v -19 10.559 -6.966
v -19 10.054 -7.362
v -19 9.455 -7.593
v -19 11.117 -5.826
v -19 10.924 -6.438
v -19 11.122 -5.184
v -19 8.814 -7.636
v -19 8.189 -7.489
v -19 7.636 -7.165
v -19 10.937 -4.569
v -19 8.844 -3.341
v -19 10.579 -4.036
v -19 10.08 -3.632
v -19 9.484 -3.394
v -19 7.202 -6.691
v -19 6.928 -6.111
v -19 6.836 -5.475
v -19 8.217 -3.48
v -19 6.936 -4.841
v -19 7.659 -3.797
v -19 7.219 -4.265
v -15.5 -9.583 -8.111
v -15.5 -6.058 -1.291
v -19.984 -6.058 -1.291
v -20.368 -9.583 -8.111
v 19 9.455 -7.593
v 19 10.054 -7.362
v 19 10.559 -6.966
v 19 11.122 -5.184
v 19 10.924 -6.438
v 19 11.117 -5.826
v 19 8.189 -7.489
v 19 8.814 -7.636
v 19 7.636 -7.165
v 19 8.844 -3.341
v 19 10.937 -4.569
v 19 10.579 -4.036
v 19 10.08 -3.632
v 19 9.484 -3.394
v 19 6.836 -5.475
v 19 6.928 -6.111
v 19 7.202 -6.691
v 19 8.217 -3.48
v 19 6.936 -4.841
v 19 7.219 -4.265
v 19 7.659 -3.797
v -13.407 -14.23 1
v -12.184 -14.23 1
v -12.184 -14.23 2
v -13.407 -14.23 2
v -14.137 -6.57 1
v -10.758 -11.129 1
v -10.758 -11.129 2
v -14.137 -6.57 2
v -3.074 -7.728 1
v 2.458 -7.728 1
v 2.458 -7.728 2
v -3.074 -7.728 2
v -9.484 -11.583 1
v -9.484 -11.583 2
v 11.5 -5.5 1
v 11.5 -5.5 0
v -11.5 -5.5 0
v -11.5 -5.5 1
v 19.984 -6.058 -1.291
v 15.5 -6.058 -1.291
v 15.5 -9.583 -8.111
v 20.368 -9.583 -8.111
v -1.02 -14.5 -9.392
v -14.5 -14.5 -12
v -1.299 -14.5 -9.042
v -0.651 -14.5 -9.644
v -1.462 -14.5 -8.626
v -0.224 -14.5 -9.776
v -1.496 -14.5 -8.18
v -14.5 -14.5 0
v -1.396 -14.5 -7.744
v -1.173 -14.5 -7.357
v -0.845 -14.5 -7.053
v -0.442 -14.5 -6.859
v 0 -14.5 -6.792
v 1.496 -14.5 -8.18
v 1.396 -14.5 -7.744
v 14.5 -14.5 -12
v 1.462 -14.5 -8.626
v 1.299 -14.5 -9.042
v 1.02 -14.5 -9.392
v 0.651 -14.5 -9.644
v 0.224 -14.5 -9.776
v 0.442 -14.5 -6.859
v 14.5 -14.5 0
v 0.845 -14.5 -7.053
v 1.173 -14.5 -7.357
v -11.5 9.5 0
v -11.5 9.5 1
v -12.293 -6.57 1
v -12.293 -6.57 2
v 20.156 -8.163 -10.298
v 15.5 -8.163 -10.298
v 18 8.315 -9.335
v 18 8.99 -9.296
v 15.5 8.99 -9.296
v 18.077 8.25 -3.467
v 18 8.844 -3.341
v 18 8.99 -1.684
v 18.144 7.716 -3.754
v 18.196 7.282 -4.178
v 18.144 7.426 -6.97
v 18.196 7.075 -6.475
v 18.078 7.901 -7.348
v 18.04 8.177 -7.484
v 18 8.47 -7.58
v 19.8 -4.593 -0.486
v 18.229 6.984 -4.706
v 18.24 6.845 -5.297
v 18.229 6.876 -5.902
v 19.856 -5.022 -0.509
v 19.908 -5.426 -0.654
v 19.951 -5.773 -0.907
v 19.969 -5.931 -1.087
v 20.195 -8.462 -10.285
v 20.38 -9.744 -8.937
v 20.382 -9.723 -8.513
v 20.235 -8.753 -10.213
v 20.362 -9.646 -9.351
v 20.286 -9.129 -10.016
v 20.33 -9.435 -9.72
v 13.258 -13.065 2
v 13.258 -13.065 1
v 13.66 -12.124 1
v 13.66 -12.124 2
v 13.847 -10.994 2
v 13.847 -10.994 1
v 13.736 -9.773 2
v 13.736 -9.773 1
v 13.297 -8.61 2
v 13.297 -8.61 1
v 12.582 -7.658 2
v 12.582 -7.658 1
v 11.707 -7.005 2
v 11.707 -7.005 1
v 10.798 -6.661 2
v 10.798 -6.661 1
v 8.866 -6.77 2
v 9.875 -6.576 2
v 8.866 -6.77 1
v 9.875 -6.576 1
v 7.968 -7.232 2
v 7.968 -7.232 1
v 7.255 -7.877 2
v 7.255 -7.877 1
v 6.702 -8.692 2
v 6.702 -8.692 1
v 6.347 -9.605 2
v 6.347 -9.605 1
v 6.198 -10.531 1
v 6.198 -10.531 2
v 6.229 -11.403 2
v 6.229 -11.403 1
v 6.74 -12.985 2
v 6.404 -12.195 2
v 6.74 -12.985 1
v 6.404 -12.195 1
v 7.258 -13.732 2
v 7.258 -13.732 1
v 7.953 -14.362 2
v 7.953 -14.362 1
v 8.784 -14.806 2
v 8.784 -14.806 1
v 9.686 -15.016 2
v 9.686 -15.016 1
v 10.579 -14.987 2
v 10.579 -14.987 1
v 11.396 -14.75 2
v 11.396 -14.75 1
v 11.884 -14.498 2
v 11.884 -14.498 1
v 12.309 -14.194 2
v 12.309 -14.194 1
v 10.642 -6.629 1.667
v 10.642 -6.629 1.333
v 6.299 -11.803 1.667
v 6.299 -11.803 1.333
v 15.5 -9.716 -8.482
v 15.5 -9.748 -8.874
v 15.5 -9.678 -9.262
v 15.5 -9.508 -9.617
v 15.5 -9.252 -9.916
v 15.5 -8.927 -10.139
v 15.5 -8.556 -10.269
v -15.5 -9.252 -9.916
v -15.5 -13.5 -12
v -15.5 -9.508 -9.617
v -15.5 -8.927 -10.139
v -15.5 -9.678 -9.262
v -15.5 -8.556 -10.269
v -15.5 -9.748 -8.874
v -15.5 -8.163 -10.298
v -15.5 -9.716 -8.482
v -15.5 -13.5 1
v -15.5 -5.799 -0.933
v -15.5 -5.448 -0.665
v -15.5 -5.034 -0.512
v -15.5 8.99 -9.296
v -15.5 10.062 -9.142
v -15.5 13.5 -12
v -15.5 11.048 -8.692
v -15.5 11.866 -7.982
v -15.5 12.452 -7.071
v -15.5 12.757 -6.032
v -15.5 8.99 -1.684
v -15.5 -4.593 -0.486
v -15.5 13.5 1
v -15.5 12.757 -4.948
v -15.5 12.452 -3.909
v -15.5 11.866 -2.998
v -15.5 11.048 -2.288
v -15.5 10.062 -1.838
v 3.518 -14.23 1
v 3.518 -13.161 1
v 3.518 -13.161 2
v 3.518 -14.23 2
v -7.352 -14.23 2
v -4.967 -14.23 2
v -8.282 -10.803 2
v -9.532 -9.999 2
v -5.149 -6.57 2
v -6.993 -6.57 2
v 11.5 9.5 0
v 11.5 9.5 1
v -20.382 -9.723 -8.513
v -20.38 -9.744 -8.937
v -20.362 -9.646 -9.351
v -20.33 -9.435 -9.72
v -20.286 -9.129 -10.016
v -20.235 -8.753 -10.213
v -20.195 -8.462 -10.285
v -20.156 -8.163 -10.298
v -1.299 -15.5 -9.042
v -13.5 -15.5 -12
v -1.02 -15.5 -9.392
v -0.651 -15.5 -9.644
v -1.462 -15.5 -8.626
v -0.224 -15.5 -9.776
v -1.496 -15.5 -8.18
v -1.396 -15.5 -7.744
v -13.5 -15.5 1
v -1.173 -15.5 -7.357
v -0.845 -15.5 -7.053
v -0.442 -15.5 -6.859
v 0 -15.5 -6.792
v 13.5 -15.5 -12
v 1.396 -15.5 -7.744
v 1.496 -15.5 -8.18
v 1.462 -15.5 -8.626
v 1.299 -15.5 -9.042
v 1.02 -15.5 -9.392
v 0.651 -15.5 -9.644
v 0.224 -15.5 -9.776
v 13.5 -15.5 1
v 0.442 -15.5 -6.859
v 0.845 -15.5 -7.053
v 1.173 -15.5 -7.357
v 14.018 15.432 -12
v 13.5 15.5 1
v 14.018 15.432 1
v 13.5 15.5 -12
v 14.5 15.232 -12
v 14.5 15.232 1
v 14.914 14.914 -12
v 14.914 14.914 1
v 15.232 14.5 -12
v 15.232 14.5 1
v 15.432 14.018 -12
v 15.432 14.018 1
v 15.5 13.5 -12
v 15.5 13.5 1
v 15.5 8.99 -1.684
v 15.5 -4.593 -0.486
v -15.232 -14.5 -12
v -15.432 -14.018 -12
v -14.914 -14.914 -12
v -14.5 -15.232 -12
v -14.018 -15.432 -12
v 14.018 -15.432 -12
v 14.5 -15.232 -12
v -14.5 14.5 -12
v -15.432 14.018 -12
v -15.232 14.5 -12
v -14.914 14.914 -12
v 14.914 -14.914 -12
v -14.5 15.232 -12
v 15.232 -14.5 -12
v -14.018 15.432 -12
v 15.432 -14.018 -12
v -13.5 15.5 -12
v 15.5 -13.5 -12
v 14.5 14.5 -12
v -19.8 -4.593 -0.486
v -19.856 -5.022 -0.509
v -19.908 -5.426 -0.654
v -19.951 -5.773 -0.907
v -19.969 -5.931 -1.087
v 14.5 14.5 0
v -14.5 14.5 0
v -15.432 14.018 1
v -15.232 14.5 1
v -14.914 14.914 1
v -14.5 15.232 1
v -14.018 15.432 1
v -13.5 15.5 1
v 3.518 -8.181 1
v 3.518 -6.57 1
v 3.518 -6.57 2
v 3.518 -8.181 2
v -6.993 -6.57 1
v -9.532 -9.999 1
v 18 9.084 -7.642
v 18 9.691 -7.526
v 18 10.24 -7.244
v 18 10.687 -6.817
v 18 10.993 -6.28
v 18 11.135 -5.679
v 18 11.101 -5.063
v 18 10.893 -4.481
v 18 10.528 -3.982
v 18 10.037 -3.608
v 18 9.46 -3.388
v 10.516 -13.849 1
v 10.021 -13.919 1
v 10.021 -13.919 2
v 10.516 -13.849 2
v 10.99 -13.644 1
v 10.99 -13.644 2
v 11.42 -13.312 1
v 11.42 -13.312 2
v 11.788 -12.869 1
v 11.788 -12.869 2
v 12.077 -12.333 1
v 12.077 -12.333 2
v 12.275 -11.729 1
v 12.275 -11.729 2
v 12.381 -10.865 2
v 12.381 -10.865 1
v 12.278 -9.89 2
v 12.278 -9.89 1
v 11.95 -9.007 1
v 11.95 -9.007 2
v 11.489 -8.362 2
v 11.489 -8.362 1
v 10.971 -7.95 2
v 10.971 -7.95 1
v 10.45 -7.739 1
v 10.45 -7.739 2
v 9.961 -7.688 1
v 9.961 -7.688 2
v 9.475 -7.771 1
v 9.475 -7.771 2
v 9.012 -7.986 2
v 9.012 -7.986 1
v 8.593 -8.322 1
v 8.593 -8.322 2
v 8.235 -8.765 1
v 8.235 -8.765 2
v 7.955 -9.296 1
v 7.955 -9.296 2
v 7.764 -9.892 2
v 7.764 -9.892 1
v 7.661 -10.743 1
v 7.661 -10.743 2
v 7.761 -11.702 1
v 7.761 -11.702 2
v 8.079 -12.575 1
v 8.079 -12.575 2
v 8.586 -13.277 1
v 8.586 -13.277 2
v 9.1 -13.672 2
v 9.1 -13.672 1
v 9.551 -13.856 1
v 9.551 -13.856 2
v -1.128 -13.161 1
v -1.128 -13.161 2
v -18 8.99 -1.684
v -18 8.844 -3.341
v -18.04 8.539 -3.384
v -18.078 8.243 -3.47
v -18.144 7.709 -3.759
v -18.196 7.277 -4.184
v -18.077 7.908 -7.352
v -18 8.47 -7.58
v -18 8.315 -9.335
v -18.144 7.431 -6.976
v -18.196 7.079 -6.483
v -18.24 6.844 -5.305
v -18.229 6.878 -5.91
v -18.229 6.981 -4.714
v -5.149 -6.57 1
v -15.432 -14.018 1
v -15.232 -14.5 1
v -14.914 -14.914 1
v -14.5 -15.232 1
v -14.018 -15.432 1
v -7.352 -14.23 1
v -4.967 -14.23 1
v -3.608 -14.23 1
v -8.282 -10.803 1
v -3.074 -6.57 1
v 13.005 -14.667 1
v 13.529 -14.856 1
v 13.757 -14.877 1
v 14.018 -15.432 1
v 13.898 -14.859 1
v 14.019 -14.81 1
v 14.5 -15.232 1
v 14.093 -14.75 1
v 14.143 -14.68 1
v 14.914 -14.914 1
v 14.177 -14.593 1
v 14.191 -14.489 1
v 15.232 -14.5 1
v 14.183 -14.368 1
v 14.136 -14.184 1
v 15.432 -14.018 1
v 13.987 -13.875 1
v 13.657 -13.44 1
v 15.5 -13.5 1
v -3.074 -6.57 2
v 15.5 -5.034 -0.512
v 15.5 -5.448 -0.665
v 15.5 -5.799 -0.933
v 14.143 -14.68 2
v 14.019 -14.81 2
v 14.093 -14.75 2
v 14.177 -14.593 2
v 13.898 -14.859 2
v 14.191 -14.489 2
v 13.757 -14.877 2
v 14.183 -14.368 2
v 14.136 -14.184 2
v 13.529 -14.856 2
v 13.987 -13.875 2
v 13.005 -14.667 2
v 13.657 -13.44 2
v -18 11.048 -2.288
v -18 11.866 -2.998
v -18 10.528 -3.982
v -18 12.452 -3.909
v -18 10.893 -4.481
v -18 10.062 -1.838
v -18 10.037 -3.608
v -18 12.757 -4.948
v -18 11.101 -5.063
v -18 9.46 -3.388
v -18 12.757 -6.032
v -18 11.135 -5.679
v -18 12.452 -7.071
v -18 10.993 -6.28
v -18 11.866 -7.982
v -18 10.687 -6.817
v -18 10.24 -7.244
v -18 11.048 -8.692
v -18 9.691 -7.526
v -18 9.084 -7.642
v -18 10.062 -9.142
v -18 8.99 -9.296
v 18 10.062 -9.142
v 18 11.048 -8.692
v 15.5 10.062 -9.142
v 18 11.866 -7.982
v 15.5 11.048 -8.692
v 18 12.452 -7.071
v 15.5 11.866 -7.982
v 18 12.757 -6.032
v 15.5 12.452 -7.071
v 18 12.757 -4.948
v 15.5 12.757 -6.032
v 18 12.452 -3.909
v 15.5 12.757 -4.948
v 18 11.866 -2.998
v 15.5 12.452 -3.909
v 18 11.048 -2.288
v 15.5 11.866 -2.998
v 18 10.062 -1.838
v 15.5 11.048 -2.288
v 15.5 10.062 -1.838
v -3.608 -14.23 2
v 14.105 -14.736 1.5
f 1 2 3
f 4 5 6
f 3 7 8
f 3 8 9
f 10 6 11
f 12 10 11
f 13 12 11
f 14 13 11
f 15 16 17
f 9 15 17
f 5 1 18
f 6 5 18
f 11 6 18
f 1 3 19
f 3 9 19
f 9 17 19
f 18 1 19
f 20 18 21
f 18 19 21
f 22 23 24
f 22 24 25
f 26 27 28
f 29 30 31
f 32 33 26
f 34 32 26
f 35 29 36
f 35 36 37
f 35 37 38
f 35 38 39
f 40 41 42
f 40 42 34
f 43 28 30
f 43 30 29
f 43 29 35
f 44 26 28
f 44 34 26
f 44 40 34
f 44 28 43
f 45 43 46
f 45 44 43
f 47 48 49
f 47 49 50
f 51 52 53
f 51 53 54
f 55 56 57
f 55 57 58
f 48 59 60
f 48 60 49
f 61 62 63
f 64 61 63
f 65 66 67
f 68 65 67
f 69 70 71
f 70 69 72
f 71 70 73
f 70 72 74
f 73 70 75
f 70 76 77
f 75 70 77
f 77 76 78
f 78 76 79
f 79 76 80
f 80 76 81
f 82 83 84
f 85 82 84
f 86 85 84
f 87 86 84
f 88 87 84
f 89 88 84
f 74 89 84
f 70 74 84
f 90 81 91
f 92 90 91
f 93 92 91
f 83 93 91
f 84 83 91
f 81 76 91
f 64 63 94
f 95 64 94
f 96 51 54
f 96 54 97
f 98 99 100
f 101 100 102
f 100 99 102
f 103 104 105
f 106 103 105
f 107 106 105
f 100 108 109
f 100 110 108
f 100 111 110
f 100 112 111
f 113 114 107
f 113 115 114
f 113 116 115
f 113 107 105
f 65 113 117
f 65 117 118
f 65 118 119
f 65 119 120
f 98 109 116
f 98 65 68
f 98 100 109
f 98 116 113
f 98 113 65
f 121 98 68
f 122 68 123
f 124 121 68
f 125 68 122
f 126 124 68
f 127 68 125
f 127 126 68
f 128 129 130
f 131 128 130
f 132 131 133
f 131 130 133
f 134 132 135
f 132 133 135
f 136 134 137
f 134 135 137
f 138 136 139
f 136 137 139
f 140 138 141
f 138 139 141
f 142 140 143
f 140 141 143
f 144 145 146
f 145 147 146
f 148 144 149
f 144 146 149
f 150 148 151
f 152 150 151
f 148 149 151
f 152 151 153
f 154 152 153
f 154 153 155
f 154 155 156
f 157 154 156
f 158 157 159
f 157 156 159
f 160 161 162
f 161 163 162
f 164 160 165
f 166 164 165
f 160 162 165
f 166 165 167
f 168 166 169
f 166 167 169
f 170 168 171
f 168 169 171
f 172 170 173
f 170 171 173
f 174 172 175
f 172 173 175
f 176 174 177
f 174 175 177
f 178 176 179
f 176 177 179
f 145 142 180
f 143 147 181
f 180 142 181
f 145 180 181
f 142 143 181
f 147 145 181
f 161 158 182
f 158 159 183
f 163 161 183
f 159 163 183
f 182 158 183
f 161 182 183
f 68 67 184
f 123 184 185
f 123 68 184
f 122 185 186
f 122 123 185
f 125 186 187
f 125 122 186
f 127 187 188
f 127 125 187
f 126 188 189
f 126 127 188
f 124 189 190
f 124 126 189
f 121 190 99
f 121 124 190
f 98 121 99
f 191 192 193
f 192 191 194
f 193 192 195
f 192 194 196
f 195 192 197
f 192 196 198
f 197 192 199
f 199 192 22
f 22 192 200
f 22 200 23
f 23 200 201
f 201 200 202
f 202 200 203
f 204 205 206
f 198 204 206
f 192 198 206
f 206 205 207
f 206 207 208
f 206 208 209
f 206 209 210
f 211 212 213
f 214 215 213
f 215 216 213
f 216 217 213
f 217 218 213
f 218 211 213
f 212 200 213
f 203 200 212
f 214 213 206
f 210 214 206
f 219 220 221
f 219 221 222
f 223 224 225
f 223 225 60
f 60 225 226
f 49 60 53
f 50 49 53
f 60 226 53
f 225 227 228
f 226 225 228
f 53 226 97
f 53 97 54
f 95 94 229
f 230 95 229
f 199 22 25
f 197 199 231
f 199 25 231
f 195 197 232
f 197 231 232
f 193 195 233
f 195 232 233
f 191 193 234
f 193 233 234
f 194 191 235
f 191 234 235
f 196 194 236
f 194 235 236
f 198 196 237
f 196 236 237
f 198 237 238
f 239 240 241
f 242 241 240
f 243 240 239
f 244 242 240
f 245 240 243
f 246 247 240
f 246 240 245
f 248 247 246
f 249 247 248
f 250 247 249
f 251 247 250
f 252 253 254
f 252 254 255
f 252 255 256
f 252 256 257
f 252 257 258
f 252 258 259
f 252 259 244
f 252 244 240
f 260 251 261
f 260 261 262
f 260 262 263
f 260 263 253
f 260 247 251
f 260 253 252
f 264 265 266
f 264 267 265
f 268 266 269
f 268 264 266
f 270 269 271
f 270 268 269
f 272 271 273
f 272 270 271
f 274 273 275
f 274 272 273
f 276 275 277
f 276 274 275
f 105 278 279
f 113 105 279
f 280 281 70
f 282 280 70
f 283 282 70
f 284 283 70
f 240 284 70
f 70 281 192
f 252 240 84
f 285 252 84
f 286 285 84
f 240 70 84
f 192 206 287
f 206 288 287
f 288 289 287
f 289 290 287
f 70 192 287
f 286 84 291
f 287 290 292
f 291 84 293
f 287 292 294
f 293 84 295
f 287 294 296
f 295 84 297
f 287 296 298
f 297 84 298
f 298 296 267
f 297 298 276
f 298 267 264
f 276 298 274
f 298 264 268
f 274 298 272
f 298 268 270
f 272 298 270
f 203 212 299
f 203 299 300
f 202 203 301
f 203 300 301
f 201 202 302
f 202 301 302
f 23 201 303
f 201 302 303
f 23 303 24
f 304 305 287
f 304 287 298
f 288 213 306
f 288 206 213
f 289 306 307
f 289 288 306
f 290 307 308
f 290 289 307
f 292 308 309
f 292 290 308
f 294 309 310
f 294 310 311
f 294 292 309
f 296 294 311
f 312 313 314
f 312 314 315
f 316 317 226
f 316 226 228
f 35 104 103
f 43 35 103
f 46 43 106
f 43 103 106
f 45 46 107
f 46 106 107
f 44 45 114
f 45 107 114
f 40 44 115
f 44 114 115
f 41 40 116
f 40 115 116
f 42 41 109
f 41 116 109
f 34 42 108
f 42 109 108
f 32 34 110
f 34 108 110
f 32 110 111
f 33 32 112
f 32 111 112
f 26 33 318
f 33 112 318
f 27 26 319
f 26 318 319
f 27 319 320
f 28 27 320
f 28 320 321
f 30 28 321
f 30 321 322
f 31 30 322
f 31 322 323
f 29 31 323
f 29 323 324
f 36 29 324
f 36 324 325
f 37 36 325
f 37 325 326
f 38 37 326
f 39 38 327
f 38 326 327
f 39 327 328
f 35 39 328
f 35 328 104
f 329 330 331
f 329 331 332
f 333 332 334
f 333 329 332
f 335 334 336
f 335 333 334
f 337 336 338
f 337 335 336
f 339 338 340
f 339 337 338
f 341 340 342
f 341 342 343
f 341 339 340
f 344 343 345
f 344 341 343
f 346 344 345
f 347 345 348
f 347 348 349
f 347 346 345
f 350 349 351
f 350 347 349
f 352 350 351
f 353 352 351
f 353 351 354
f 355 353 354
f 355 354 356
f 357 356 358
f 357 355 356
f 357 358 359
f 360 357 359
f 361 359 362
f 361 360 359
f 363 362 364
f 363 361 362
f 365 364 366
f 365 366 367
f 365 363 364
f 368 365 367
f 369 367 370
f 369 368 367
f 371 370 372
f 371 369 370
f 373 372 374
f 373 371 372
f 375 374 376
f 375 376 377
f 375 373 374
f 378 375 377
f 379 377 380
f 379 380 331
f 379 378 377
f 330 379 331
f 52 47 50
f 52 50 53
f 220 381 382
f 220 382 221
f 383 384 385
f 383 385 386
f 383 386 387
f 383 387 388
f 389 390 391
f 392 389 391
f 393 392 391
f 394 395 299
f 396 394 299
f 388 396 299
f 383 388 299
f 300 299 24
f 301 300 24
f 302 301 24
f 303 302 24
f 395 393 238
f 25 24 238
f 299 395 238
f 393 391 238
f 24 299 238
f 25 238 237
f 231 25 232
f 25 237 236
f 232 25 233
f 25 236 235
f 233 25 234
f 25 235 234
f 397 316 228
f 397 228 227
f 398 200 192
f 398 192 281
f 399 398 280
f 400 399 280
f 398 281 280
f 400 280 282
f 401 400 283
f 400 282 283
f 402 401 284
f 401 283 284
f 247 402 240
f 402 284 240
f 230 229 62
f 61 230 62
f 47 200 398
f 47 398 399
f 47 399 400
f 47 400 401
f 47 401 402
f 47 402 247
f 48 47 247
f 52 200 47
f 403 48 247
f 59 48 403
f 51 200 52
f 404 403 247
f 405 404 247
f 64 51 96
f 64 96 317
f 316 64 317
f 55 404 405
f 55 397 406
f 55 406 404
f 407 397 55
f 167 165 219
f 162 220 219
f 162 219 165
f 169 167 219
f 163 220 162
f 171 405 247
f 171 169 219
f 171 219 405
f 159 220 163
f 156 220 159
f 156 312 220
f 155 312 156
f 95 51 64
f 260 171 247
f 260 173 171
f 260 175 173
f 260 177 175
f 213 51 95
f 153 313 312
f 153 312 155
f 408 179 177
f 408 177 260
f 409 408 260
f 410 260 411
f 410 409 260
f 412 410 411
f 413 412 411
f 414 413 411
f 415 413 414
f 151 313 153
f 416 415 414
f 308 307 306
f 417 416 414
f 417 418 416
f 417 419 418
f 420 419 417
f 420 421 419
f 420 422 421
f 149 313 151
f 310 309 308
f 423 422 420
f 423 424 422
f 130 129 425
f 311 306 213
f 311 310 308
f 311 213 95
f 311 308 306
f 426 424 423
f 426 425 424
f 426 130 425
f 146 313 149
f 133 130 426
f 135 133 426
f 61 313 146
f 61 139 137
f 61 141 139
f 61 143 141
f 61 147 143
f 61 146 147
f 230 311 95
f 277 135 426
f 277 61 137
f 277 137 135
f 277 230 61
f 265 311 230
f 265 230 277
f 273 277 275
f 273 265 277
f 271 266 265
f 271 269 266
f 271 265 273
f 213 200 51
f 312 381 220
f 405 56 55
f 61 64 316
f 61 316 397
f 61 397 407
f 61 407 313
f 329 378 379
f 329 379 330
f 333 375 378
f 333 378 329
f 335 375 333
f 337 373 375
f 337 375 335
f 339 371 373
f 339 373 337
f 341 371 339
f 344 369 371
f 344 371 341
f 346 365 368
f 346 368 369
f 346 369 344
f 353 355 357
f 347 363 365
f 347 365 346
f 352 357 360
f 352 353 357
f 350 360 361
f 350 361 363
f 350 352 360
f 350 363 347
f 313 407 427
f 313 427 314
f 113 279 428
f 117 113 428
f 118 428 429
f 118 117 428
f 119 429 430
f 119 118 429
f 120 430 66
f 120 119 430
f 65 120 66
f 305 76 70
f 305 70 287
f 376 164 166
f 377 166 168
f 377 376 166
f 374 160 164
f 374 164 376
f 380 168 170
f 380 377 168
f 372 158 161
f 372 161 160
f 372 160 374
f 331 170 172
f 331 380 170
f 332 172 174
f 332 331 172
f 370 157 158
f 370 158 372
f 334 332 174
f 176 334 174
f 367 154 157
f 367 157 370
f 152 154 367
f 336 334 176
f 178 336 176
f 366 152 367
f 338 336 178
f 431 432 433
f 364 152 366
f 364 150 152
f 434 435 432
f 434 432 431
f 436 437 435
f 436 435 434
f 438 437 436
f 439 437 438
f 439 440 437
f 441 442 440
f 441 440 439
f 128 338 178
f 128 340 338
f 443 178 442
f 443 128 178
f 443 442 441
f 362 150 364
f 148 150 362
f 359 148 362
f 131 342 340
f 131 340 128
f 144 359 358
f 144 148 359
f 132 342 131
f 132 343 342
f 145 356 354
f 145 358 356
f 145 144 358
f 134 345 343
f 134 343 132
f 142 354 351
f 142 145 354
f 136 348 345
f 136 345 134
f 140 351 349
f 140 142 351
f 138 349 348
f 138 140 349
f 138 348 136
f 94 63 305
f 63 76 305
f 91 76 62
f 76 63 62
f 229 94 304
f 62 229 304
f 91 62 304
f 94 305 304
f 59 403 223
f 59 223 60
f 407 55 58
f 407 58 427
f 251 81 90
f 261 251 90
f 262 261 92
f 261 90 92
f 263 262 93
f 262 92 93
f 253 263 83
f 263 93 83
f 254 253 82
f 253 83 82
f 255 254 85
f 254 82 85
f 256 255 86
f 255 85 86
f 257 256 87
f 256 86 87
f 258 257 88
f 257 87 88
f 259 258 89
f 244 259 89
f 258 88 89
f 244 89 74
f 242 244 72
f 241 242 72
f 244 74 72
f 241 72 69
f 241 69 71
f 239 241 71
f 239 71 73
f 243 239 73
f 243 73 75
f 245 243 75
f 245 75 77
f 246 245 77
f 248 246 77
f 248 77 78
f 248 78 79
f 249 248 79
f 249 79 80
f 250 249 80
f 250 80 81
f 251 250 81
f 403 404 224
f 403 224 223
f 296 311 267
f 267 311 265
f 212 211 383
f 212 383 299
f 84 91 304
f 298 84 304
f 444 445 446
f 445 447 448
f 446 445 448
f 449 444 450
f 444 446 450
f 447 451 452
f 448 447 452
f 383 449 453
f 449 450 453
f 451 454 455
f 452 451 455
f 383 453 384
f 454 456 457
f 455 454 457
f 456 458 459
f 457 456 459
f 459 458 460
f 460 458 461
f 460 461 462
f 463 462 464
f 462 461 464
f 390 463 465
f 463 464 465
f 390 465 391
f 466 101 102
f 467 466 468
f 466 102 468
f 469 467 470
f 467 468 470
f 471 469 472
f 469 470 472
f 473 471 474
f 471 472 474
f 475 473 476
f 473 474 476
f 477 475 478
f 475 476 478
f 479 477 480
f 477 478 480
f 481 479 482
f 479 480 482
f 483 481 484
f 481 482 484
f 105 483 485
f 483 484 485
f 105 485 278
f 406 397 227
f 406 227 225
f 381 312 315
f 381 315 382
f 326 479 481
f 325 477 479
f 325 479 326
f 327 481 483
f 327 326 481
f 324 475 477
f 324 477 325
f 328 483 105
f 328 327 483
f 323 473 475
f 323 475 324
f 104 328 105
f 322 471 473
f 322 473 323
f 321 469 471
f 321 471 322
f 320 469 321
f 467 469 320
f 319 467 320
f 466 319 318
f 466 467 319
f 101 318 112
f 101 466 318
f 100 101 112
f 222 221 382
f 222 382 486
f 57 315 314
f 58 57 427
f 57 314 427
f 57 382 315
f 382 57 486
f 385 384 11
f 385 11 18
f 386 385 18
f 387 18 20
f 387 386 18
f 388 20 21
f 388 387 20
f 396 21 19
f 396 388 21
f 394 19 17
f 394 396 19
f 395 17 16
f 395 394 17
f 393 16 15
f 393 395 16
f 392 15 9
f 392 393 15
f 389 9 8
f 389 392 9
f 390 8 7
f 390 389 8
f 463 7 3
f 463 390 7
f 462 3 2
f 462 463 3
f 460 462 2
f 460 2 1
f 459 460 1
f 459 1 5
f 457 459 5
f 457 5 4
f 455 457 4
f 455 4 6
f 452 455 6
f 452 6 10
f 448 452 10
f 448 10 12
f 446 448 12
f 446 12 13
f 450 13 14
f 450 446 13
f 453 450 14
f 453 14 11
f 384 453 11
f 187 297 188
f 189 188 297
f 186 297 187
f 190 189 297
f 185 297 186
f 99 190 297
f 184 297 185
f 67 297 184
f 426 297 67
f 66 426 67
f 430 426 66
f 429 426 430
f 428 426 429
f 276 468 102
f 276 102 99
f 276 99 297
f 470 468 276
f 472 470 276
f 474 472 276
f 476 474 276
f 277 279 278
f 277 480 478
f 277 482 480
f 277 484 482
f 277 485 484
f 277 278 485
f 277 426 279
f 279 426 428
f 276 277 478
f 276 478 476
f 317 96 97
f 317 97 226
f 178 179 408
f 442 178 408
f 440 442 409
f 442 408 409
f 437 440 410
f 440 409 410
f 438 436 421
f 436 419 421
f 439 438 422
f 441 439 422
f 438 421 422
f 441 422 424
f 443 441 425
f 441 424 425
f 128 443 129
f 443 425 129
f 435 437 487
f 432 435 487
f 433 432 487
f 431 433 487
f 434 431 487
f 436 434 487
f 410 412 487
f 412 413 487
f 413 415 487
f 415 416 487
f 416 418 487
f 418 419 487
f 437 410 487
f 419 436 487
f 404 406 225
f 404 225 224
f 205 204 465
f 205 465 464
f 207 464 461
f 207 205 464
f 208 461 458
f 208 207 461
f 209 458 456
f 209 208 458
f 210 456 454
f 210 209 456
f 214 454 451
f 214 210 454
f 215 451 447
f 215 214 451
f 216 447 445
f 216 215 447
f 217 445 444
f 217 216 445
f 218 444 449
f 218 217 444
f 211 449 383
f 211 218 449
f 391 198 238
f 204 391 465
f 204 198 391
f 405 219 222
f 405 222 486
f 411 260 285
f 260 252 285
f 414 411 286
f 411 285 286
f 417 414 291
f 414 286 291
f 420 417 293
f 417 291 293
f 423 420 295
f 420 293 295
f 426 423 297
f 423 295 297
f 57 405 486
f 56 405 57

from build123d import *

# Parameters (mm, degrees)
SKETCH_1_W          = 29
SKETCH_1_H          = 29
EXTRUDE_1_DEPTH     = 1
SKETCH_2_W          = 31
SKETCH_2_H          = 31
SKETCH_2_W_2        = 29
SKETCH_2_H_2        = 29
EXTRUDE_2_DEPTH     = 13
EXTRUDE_4_DEPTH     = 5
CUT_EXTRUDE_START   = -14
CUT_EXTRUDE_2_DEPTH = 27
SKETCH_5_R          = 2.15366908
EXTRUDE_5_DEPTH     = 1
FILLET_2_R          = 2
FILLET_3_R          = 1.5
SKETCH_6_R          = 1.5
CUT_EXTRUDE_3_DEPTH = 10
SKETCH_7_RX         = 3.115871069
SKETCH_7_RY         = 2.3606007
EXTRUDE_6_DEPTH     = 1


with BuildPart() as part:
    # 草图1 → 凸台-拉伸1 (new body)
    with BuildSketch(Plane.XY):
        Rectangle(SKETCH_1_W, SKETCH_1_H)
        Polygon((-11.5, 0), (-11.5, 9.5), (11.5, 9.5), (11.5, -5.5), (-11.5, -5.5), align=None, mode=Mode.SUBTRACT)
    extrude(amount=EXTRUDE_1_DEPTH)

    # 草图2 → 凸台-拉伸2 (add)
    with BuildSketch(Plane.XY.offset(1)):
        Rectangle(SKETCH_2_W, SKETCH_2_H)
        Rectangle(SKETCH_2_W_2, SKETCH_2_H_2, mode=Mode.SUBTRACT)
    extrude(amount=-EXTRUDE_2_DEPTH)

    # 草图3 → 凸台-拉伸4 (add)
    with BuildSketch(Plane(origin=(15.5, 0, 0), x_dir=(0, 0, -1), z_dir=(1, 0, 0))):
        with BuildLine():
            Line((1.684082639, 8.989995997), (0.397094894, -5.595641246))
            Line((0.397094894, -5.595641246), (10.451208148, -10.79214922))
            Line((10.451208148, -10.79214922), (9.295909354, 8.989995997))
            ThreePointArc((9.295909354, 8.989995997), (5.489995997, 12.795909354), (1.684082639, 8.989995997))
        make_face()
    extrude_4 = extrude(amount=EXTRUDE_4_DEPTH)

    # 草图4 → 切除-拉伸2 (cut)
    with BuildSketch(Plane(origin=(0, -0.077997079, -0.883953322), x_dir=(1, 0, 0), z_dir=(0, 0.08789514896151537, 0.9961297319069606)).offset(CUT_EXTRUDE_START)):
        Polygon((18, 9.103224997), (20.5, -9.831770213), (20.5, 13.243659675), (18, 13.243659675), align=None)
    cut_extrude_2 = extrude(amount=CUT_EXTRUDE_2_DEPTH, mode=Mode.SUBTRACT)

    # 草图5 → 凸台-拉伸5 (add)
    with BuildSketch(Plane(origin=(18, 0, 0), x_dir=(0, 0, -1), z_dir=(1, 0, 0))):
        with Locations((5.489995997, 8.989995997)):
            Circle(SKETCH_5_R)
    extrude_5 = extrude(amount=EXTRUDE_5_DEPTH)

    # 镜向1: 凸台-拉伸4, 切除-拉伸2, 凸台-拉伸5 across plane
    add(extrude_4.mirror(Plane(origin=(0, 0, 0), x_dir=(0, 0, 1), z_dir=(1, 0, 0))))
    add(cut_extrude_2.mirror(Plane(origin=(0, 0, 0), x_dir=(0, 0, 1), z_dir=(1, 0, 0))), mode=Mode.SUBTRACT)
    add(extrude_5.mirror(Plane(origin=(0, 0, 0), x_dir=(0, 0, 1), z_dir=(1, 0, 0))))

    # 圆角2
    fillet_2_edges = [part.edges().sort_by_distance(p)[0] for p in [
        (15.5, -15.5, -5.5),
        (15.5, 15.5, -5.5),
        (-15.5, 15.5, -5.5),
        (-15.5, -15.5, -5.5),
    ]]
    fillet(fillet_2_edges, radius=FILLET_2_R)

    # 圆角3
    fillet_3_edges = [part.edges().sort_by_distance(p)[0] for p in [
        (18, -10.79214922, -10.451208148),
        (17.716616755, -5.595641246, -0.397094894),
        (-18, -10.79214922, -10.451208148),
        (-17.716616755, -5.595641246, -0.397094894),
    ]]
    fillet(fillet_3_edges, radius=FILLET_3_R)

    # 草图6 → 切除-拉伸3 (cut)
    with BuildSketch(Plane(origin=(0, -14.5, 0), x_dir=(1, 0, 0), z_dir=(0, 1, 0))):
        with Locations((0, 8.292466775)):
            Circle(SKETCH_6_R)
    extrude(amount=-CUT_EXTRUDE_3_DEPTH, mode=Mode.SUBTRACT)

    # 草图7 → 凸台-拉伸6 (add)
    # profile 1 of 3: a face of its own
    with BuildSketch(Plane.XY.offset(1)):
        Polygon((-14.13707497, -6.569596288), (-12.29339398, -6.569596288), (-9.531936558, -9.999148248), (-6.993177314, -6.569596288), (-5.148542266, -6.569596288), (-8.282186736, -10.802765134), (-4.967091233, -14.230413654), (-7.35222414, -14.230413654), (-9.483652502, -11.583317139), (-12.183939304, -14.230413654), (-13.406884876, -14.230413654), (-10.757959228, -11.129248682), align=None)
    # profile 2 of 3: a face of its own
    with BuildSketch(Plane.XY.offset(1)):
        Polygon((-3.07368936, -6.569596288), (3.518176746, -6.569596288), (3.518176746, -8.181354333), (-1.127695874, -13.161462393), (3.518176746, -13.161462393), (3.518176746, -14.230413654), (-3.60816499, -14.230413654), (2.458193197, -7.72762682), (-3.07368936, -7.72762682), align=None)
    # profile 3 of 3: a face of its own
    with BuildSketch(Plane.XY.offset(1)):
        with BuildLine():
            add(Edge.make_bspline(
                [(13.257578349, -13.064625962), (16.352824865, -7.664798791), (10.641635787, -6.629296303), (4.930446709, -5.593793814), (6.299215158, -11.802996851), (7.667983606, -18.012199887), (12.309307415, -14.194426658)],
                knots=[1.006525836, 1.006525836, 1.006525836, 2.978836938, 2.978836938, 4.95114804, 4.95114804, 6.923459142, 6.923459142, 6.923459142], degree=2, weights=[1, 0.551899857, 1, 0.551899857, 1, 0.551899857, 1]))
            add(Edge.make_bspline(
                [(12.309307415, -14.194426658), (13.611329655, -15.324791628), (14.10540557, -14.736133584), (14.599481485, -14.147475541), (13.257578349, -13.064625962)],
                knots=[4.671290612, 4.671290612, 4.671290612, 6.282456981, 6.282456981, 7.89362335, 7.89362335, 7.89362335], degree=2, weights=[1, 0.69269074, 1, 0.69269074, 1]))
        make_face()
        with Locations(Location((10.02096358, -10.802765134), (0, 0, -90))):
            Ellipse(SKETCH_7_RX, SKETCH_7_RY, mode=Mode.SUBTRACT)
    extrude(amount=EXTRUDE_6_DEPTH)


solid = part.part
